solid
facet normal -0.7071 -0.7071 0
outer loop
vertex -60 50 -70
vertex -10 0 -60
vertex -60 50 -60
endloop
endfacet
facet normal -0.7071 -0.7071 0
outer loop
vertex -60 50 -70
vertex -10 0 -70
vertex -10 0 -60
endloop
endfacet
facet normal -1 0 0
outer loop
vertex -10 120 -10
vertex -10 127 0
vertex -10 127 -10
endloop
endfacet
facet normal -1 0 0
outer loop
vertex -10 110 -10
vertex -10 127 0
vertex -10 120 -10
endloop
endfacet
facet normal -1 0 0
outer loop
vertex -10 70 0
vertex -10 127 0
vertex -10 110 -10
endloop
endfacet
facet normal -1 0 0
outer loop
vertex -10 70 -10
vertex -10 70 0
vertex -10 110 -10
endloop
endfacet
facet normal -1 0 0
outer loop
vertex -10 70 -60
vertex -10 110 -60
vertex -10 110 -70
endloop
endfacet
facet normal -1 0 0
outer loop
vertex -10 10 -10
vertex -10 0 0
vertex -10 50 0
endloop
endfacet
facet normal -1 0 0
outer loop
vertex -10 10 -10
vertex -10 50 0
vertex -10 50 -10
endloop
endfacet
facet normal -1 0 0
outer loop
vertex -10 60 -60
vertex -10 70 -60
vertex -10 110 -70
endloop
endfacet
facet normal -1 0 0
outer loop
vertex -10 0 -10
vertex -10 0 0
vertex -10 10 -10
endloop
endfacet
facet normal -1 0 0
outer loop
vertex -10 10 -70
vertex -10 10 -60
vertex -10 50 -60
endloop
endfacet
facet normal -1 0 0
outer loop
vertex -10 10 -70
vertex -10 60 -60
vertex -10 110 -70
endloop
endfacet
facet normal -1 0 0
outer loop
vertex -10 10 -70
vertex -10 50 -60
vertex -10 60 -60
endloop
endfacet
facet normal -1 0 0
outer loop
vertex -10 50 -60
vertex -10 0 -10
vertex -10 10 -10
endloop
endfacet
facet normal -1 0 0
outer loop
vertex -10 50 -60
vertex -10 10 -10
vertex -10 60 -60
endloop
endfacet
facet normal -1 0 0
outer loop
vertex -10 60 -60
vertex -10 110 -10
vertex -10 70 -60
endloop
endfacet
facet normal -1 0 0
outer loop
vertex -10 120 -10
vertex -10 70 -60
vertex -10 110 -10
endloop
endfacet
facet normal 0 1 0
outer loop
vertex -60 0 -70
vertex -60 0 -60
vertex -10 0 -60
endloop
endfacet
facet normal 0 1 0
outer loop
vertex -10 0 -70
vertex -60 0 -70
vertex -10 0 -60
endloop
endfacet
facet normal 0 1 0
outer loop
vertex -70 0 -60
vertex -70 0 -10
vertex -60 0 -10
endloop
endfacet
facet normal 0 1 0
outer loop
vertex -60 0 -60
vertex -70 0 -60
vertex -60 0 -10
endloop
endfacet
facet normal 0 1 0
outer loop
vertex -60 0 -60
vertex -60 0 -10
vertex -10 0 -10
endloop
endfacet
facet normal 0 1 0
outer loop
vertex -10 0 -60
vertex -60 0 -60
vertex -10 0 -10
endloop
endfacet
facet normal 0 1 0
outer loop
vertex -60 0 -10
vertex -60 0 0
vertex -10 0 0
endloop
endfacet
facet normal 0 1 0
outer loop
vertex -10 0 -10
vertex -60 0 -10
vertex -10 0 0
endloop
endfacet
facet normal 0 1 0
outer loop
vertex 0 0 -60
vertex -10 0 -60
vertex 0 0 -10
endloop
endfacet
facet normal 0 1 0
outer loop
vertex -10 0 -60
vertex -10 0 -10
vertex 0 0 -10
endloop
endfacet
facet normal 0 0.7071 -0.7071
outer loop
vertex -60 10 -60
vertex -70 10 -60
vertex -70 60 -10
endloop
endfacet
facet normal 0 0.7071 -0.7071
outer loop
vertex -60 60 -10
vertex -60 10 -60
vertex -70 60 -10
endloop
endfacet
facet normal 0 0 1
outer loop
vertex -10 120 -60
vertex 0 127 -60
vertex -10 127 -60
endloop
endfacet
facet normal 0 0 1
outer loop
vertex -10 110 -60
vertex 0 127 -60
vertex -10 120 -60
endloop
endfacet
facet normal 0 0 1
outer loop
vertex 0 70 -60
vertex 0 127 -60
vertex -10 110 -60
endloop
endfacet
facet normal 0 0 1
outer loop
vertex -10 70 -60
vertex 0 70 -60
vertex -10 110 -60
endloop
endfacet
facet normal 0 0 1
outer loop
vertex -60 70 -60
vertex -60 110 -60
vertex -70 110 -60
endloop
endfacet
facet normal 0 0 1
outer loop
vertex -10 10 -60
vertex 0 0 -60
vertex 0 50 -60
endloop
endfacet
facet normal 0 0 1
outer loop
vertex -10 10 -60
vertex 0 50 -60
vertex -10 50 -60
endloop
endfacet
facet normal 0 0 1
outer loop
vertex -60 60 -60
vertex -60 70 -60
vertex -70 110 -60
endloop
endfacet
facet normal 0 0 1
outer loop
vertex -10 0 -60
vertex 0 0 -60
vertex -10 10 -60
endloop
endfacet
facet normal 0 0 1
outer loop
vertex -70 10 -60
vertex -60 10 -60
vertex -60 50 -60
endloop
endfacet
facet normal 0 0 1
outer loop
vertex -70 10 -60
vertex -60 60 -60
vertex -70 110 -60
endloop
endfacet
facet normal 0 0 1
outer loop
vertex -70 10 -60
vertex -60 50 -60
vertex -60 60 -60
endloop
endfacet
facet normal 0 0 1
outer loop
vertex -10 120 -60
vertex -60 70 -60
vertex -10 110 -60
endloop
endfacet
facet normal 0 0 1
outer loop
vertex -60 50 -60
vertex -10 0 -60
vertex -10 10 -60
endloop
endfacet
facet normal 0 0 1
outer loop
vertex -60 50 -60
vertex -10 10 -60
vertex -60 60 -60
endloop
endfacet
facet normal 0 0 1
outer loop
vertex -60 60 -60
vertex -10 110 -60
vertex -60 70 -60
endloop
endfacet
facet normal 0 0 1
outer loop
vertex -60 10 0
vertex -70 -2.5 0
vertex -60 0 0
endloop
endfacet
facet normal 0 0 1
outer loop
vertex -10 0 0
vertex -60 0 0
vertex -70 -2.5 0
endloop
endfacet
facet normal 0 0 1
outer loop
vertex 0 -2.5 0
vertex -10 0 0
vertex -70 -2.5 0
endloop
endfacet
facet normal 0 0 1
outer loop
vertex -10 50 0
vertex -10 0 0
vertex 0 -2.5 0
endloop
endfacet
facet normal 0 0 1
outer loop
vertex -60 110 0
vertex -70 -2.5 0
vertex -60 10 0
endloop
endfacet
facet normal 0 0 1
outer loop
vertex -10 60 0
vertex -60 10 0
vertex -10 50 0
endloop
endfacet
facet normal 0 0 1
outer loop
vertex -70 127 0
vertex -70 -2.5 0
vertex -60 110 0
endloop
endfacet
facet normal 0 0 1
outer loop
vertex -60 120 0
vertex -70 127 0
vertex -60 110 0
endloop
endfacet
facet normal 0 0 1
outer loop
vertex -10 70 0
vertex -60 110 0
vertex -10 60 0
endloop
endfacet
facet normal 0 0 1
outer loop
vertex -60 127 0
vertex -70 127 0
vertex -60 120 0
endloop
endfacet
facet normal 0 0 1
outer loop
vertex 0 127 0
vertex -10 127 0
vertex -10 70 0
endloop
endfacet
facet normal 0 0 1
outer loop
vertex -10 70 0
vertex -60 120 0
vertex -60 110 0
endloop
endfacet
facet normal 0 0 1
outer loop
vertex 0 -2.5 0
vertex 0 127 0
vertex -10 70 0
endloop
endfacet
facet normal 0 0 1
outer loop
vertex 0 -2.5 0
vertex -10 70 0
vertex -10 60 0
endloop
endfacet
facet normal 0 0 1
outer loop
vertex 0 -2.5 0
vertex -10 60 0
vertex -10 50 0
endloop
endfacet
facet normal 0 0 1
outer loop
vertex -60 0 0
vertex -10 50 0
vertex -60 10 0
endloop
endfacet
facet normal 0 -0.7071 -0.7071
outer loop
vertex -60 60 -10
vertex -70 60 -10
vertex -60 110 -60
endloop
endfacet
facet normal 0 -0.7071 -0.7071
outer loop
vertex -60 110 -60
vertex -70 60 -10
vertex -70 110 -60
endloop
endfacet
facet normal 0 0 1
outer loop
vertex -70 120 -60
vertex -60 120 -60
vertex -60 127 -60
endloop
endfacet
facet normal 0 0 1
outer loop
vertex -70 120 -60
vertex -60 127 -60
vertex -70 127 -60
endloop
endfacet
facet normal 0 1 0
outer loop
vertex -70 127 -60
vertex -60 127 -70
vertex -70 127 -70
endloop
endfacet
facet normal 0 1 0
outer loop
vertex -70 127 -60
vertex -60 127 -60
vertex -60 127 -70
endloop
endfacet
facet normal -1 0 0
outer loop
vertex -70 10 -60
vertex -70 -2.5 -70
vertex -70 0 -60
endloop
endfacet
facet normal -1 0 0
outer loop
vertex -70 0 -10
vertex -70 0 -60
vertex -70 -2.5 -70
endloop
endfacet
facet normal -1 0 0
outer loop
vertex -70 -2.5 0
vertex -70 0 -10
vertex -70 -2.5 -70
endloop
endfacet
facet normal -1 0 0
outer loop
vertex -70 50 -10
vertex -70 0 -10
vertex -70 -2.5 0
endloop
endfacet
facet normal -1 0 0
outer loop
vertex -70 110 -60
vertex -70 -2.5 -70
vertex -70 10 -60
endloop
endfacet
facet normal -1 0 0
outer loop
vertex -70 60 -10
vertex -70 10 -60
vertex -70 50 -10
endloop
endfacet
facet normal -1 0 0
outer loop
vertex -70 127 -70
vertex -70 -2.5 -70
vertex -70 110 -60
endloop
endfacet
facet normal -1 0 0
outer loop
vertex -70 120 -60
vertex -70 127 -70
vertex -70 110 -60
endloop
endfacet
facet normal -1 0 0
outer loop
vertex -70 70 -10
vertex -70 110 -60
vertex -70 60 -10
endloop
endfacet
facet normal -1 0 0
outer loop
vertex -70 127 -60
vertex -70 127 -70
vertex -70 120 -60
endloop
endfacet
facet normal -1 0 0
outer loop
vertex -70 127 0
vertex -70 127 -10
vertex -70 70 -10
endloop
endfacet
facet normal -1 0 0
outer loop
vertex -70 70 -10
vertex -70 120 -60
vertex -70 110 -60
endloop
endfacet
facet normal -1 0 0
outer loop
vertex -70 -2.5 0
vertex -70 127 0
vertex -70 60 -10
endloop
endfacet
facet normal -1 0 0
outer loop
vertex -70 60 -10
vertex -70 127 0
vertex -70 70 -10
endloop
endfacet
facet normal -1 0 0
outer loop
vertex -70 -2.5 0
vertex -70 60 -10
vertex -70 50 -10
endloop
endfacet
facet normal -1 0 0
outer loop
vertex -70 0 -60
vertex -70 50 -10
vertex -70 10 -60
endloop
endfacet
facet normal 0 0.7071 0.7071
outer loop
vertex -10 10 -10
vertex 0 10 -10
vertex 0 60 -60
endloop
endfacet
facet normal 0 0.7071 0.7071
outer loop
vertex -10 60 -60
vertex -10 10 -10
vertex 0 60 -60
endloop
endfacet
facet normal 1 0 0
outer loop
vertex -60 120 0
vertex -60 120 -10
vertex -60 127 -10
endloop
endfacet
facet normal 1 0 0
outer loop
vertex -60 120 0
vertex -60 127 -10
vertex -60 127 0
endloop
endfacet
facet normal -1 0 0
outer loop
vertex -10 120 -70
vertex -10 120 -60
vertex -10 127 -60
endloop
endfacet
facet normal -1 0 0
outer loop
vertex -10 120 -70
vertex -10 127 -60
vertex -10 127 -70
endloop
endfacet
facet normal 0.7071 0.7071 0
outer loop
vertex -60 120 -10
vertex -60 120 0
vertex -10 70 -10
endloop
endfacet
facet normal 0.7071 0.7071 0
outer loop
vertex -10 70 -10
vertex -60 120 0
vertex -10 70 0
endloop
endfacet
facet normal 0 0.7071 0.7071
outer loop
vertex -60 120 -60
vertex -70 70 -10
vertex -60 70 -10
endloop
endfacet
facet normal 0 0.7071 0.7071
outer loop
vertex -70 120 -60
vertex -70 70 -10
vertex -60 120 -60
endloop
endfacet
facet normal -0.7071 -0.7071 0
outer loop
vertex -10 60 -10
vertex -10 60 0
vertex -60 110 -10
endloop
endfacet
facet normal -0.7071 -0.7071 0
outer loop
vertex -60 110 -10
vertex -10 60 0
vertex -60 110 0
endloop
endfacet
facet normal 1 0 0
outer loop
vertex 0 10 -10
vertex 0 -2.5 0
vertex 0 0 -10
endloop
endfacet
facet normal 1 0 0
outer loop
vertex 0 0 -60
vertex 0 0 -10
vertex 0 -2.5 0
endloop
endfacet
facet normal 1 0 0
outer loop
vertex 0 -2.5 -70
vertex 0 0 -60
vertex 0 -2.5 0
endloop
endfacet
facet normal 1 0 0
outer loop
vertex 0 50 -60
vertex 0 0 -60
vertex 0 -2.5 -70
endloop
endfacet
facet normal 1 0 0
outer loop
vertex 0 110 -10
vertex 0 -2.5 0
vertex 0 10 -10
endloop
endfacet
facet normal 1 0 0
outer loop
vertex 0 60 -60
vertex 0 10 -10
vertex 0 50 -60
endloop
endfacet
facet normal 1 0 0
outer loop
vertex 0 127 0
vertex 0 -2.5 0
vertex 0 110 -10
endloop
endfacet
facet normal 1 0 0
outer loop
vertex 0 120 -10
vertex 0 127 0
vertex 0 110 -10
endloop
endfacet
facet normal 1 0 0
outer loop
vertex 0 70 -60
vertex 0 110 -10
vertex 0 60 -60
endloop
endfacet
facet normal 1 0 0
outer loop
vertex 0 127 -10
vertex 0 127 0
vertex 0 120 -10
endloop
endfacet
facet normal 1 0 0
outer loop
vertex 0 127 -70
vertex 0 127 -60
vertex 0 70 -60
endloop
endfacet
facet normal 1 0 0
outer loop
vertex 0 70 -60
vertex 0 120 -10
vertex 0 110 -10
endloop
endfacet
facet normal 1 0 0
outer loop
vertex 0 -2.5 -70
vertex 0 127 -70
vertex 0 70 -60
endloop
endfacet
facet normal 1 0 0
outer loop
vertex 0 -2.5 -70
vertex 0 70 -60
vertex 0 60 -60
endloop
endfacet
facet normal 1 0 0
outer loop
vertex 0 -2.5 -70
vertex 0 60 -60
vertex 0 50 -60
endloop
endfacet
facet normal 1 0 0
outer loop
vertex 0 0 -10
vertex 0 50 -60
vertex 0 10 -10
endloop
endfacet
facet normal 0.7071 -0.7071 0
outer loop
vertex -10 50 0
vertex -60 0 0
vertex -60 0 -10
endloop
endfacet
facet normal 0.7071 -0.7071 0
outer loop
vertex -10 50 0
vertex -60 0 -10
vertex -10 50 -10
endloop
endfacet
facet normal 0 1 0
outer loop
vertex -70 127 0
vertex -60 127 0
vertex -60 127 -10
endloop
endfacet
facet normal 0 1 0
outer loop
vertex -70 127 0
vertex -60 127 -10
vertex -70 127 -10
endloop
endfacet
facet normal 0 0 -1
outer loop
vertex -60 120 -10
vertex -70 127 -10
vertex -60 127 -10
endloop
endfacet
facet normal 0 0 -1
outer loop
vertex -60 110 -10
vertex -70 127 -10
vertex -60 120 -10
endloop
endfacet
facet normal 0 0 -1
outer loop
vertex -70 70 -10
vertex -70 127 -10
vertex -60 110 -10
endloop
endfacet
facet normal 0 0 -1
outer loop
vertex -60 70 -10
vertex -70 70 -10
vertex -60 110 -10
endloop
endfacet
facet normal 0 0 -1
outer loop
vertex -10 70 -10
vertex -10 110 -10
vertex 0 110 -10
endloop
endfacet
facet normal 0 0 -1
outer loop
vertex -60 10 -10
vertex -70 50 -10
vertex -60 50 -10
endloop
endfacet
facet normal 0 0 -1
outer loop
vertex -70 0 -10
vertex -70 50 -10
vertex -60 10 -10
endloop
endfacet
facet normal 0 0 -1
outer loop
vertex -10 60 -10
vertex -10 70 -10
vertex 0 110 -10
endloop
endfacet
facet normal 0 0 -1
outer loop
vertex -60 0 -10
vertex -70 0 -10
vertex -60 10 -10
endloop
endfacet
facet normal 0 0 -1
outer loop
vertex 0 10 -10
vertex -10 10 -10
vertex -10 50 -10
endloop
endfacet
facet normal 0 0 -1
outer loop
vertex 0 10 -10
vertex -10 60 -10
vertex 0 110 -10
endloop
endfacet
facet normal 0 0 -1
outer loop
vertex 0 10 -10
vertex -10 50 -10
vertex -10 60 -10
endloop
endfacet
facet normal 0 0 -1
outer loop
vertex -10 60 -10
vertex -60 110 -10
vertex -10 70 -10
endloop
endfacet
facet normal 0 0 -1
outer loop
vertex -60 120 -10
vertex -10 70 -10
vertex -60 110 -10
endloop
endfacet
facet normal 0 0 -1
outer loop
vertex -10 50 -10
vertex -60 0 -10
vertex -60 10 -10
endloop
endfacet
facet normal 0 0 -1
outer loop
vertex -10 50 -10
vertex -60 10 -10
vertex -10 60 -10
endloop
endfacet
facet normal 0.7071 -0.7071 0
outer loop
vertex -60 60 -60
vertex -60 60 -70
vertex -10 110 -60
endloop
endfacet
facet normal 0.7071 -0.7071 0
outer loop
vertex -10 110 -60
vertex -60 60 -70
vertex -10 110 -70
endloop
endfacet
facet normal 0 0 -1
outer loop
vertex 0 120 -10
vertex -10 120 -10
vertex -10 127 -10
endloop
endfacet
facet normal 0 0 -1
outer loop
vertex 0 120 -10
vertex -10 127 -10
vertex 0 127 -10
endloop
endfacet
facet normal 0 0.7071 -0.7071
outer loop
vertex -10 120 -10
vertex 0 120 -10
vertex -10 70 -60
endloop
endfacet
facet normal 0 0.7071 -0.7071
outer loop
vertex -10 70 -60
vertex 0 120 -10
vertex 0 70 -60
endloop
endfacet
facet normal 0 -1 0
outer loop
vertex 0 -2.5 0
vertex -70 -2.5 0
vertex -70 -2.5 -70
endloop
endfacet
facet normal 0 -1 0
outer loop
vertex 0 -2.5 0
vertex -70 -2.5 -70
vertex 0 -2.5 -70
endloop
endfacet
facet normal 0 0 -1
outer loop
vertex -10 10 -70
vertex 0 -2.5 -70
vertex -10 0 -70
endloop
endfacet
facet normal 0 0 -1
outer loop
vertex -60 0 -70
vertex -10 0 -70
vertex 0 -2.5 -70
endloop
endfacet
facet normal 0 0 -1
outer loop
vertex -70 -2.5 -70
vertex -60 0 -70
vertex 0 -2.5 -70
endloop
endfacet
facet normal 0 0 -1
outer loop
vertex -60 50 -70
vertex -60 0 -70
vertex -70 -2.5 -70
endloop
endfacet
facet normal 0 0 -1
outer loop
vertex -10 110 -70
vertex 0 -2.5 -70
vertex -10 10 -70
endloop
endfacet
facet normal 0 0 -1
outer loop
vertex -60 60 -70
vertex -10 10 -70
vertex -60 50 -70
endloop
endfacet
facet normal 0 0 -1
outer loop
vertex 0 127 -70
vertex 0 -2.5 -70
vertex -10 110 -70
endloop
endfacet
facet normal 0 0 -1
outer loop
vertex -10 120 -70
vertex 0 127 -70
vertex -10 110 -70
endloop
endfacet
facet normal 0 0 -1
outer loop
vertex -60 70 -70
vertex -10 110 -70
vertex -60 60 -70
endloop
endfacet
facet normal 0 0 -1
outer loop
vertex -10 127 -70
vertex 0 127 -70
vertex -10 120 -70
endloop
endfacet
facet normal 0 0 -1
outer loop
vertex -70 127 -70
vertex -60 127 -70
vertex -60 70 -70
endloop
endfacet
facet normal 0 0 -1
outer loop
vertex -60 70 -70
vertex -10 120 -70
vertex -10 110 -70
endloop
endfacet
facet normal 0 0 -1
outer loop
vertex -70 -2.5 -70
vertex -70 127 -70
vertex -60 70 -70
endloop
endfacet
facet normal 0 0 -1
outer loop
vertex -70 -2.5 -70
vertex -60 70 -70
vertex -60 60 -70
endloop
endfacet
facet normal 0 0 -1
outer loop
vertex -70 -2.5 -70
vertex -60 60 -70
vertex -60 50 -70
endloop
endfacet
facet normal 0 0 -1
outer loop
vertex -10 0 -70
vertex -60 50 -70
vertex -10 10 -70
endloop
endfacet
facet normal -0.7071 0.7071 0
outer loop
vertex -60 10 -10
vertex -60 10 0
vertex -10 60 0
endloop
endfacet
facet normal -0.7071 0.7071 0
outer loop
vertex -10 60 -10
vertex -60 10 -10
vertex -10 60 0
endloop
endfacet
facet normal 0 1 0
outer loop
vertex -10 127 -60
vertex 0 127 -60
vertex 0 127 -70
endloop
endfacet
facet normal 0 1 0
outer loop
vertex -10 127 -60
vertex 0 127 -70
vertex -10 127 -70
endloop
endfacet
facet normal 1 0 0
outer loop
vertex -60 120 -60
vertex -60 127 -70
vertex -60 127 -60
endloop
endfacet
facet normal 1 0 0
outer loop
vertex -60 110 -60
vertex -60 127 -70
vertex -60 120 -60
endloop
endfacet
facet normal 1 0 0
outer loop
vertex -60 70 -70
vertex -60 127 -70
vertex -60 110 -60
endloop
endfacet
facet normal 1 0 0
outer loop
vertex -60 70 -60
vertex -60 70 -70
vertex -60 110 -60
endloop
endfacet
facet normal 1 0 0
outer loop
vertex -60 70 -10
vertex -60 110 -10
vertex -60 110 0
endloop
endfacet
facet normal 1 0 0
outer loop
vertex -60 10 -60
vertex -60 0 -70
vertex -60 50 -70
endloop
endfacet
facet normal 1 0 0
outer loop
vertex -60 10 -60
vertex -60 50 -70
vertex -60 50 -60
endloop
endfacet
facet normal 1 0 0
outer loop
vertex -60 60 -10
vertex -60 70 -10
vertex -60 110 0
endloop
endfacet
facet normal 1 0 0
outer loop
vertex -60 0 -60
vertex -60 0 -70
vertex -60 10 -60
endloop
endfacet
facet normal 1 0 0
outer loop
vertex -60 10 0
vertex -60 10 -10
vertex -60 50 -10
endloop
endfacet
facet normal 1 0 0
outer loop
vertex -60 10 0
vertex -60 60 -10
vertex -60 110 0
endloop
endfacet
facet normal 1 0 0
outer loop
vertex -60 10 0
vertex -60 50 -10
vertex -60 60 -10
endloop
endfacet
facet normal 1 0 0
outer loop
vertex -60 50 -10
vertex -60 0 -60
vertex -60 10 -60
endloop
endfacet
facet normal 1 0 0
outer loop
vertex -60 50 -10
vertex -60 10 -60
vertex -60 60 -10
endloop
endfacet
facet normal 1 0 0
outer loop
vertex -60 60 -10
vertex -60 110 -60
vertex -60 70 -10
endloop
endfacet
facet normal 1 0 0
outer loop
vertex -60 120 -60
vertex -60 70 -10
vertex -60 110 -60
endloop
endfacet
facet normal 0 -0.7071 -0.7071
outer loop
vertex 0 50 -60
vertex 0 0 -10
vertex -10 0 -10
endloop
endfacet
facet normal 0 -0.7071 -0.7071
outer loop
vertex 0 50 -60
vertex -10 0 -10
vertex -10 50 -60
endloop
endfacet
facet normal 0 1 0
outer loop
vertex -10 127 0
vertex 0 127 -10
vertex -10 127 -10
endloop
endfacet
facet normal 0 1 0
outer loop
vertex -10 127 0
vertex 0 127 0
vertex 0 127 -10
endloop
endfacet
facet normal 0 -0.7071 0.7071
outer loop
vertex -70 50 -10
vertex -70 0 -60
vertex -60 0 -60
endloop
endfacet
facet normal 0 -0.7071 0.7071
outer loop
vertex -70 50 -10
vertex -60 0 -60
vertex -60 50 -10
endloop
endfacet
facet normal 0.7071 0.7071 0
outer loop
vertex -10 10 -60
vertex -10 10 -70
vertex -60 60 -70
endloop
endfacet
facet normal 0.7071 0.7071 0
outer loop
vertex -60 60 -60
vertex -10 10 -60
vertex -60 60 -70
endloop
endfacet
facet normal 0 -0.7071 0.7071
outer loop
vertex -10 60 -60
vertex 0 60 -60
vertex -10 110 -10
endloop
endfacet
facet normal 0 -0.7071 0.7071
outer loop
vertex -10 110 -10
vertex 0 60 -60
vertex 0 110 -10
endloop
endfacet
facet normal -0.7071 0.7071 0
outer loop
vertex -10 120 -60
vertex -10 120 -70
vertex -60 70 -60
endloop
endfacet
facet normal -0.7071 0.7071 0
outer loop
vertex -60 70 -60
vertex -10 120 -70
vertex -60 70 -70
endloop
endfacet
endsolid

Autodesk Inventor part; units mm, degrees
ref_plane "YZ Plane" through (0, 0, 0) normal (1, 0, 0) x (0, 1, 0)
ref_plane "XZ Plane" through (0, 0, 0) normal (0, 1, 0) x (-1, 0, 0)
ref_plane "XY Plane" through (0, 0, 0) normal (0, 0, 1) x (1, 0, 0)
sketch "Sketch1" plane through (0, 0, 0) normal (0, 1, 0) x (-1, 0, 0)
  line L0 (0, 0) -> (10, 0)
  line L1 (10, 0) -> (10, -10)
  line L2 (10, -10) -> (0, -10)
  line L3 (0, -10) -> (0, 0)
  line L4 (70, -10) -> (60, -10)
  line L5 (60, -10) -> (60, 0)
  line L6 (60, 0) -> (70, 0)
  line L7 (70, 0) -> (70, -10)
  line L8 (70, -70) -> (60, -70)
  line L9 (60, -70) -> (60, -60)
  line L10 (60, -60) -> (70, -60)
  line L11 (70, -60) -> (70, -70)
  line L12 (10, -70) -> (0, -70)
  line L13 (0, -70) -> (0, -60)
  line L14 (0, -60) -> (10, -60)
  line L15 (10, -60) -> (10, -70)
  dimension "d0" = 10
  dimension "d1" = 10
  dimension "d2" = 10
  dimension "d3" = 10
  dimension "d4" = 10
  dimension "d5" = 10
  dimension "d6" = 10
  dimension "d7" = 10
  dimension "d8" = 50
  dimension "d9" = 50
extrude "Extrusion1" add sketch "Sketch1" along normal blind 127
sketch "Sketch2" plane through (-70, 0, 0) normal (0, 0, 1) x (1, 0, 0)
  line L0 (10, 0) -> (10, 127) construction
  line L1 (10, 0) -> (60, 50)
  line L2 (60, 0) -> (60, 127) construction
  line L3 (10, 0) -> (80.7107, 0) construction
  line L4 (10, 10) -> (60, 60)
  line L5 (60, 60) -> (10, 110)
  line L6 (60, 60) -> (130.7107, 60) construction
  line L7 (10, 120) -> (60, 70)
  line L8 (60, 70) -> (60, 50)
  line L9 (10, 120) -> (10, 110)
  line L10 (10, 0) -> (10, 10)
  point P0 (70, 0)
  dimension "d12" = 45
  dimension "d14" = 10
  dimension "d15" = 135
  dimension "d16" = 10
  dimension "d17" = 10
extrude "Extrusion2" add sketch "Sketch2" against normal blind 10
sketch "Sketch3" plane through (0, 0, 0) normal (1, 0, 0) x (0, 0, -1)
  line L0 (10, 0) -> (10, 127) construction
  line L1 (10, 0) -> (60, 50)
  line L2 (10, 0) -> (70, 0) construction
  line L3 (60, 0) -> (60, 127) construction
  line L4 (60, 0) -> (70, 0) construction
  line L5 (60, 127) -> (60, 0)
  line L6 (10, 10) -> (60, 60)
  line L7 (10, 0) -> (10, 127)
  line L8 (60, 60) -> (10, 110)
  line L9 (60, 60) -> (70, 60) construction
  line L10 (10, 120) -> (60, 70)
  dimension "d20" = 45
  dimension "d21" = 10
  dimension "d22" = 135
  dimension "d23" = 10
extrude "Extrusion3" add sketch "Sketch3" against normal blind 10 contours L7 L6 L5 L1 | L8 L7 L10 L5
sketch "Sketch4" plane through (0, 0, -70) normal (0, 0, -1) x (-1, 0, 0)
  line L0 (10, 0) -> (10, 127) construction
  line L1 (10, 0) -> (60, 50)
  line L2 (60, 10) -> (60, 110) construction
  line L3 (10, 0) -> (80.7107, 0) construction
  line L4 (10, 10) -> (60, 60)
  line L5 (60, 120) -> (60, 127) construction
  line L6 (60, 127) -> (60, 0)
  line L7 (10, 0) -> (10, 127)
  line L8 (60, 60) -> (10, 110)
  line L9 (60, 60) -> (70, 60) construction
  line L10 (10, 120) -> (60, 70)
  point P0 (70, 0)
  point P1 (60, 60)
  point P2 (60, 60)
  point P3 (60, 50)
  dimension "d26" = 45
  dimension "d27" = 10
  dimension "d28" = 135
  dimension "d29" = 10
extrude "Extrusion4" add sketch "Sketch4" against normal blind 10 contours L7 L4 L6 L1 | L8 L7 L10 L6
sketch "Sketch5" plane through (-70, 0, -70) normal (-1, 0, 0) x (0, 0, 1)
  line L0 (10, 0) -> (10, 127) construction
  line L1 (60, 10) -> (60, 50) construction
  line L2 (10, 0) -> (60, 50)
  line L3 (10, 0) -> (80.7107, 0) construction
  line L4 (10, 127) -> (10, 0)
  line L5 (60, 127) -> (60, 0)
  line L6 (10, 10) -> (60, 60)
  line L7 (60, 60) -> (10, 110)
  line L8 (60, 60) -> (70, 60) construction
  line L9 (60, 70) -> (10, 120)
  line L10 (10, 70) -> (60, 120) construction
  point P0 (70, 0)
  dimension "d32" = 45
  dimension "d33" = 135
  dimension "d34" = 10
  dimension "d35" = 10
extrude "Extrusion5" add sketch "Sketch5" against normal blind 10 contours L4 L6 L5 L2 | L7 L4 L9 L5
sketch "Sketch6" plane through (0, 0, 0) normal (0, -1, 0) x (1, 0, 0)
  line L0 (-70, -10) -> (-70, 0) construction
  line L1 (0, -70) -> (-70, -70)
  line L2 (-70, -70) -> (-70, 0)
  line L3 (-70, 0) -> (0, 0)
  line L4 (0, 0) -> (0, -70)
  point P0 (0, 0)
extrude "Extrusion6" add sketch "Sketch6" along normal blind 2.5
properties part number "TRUSSTEST"
